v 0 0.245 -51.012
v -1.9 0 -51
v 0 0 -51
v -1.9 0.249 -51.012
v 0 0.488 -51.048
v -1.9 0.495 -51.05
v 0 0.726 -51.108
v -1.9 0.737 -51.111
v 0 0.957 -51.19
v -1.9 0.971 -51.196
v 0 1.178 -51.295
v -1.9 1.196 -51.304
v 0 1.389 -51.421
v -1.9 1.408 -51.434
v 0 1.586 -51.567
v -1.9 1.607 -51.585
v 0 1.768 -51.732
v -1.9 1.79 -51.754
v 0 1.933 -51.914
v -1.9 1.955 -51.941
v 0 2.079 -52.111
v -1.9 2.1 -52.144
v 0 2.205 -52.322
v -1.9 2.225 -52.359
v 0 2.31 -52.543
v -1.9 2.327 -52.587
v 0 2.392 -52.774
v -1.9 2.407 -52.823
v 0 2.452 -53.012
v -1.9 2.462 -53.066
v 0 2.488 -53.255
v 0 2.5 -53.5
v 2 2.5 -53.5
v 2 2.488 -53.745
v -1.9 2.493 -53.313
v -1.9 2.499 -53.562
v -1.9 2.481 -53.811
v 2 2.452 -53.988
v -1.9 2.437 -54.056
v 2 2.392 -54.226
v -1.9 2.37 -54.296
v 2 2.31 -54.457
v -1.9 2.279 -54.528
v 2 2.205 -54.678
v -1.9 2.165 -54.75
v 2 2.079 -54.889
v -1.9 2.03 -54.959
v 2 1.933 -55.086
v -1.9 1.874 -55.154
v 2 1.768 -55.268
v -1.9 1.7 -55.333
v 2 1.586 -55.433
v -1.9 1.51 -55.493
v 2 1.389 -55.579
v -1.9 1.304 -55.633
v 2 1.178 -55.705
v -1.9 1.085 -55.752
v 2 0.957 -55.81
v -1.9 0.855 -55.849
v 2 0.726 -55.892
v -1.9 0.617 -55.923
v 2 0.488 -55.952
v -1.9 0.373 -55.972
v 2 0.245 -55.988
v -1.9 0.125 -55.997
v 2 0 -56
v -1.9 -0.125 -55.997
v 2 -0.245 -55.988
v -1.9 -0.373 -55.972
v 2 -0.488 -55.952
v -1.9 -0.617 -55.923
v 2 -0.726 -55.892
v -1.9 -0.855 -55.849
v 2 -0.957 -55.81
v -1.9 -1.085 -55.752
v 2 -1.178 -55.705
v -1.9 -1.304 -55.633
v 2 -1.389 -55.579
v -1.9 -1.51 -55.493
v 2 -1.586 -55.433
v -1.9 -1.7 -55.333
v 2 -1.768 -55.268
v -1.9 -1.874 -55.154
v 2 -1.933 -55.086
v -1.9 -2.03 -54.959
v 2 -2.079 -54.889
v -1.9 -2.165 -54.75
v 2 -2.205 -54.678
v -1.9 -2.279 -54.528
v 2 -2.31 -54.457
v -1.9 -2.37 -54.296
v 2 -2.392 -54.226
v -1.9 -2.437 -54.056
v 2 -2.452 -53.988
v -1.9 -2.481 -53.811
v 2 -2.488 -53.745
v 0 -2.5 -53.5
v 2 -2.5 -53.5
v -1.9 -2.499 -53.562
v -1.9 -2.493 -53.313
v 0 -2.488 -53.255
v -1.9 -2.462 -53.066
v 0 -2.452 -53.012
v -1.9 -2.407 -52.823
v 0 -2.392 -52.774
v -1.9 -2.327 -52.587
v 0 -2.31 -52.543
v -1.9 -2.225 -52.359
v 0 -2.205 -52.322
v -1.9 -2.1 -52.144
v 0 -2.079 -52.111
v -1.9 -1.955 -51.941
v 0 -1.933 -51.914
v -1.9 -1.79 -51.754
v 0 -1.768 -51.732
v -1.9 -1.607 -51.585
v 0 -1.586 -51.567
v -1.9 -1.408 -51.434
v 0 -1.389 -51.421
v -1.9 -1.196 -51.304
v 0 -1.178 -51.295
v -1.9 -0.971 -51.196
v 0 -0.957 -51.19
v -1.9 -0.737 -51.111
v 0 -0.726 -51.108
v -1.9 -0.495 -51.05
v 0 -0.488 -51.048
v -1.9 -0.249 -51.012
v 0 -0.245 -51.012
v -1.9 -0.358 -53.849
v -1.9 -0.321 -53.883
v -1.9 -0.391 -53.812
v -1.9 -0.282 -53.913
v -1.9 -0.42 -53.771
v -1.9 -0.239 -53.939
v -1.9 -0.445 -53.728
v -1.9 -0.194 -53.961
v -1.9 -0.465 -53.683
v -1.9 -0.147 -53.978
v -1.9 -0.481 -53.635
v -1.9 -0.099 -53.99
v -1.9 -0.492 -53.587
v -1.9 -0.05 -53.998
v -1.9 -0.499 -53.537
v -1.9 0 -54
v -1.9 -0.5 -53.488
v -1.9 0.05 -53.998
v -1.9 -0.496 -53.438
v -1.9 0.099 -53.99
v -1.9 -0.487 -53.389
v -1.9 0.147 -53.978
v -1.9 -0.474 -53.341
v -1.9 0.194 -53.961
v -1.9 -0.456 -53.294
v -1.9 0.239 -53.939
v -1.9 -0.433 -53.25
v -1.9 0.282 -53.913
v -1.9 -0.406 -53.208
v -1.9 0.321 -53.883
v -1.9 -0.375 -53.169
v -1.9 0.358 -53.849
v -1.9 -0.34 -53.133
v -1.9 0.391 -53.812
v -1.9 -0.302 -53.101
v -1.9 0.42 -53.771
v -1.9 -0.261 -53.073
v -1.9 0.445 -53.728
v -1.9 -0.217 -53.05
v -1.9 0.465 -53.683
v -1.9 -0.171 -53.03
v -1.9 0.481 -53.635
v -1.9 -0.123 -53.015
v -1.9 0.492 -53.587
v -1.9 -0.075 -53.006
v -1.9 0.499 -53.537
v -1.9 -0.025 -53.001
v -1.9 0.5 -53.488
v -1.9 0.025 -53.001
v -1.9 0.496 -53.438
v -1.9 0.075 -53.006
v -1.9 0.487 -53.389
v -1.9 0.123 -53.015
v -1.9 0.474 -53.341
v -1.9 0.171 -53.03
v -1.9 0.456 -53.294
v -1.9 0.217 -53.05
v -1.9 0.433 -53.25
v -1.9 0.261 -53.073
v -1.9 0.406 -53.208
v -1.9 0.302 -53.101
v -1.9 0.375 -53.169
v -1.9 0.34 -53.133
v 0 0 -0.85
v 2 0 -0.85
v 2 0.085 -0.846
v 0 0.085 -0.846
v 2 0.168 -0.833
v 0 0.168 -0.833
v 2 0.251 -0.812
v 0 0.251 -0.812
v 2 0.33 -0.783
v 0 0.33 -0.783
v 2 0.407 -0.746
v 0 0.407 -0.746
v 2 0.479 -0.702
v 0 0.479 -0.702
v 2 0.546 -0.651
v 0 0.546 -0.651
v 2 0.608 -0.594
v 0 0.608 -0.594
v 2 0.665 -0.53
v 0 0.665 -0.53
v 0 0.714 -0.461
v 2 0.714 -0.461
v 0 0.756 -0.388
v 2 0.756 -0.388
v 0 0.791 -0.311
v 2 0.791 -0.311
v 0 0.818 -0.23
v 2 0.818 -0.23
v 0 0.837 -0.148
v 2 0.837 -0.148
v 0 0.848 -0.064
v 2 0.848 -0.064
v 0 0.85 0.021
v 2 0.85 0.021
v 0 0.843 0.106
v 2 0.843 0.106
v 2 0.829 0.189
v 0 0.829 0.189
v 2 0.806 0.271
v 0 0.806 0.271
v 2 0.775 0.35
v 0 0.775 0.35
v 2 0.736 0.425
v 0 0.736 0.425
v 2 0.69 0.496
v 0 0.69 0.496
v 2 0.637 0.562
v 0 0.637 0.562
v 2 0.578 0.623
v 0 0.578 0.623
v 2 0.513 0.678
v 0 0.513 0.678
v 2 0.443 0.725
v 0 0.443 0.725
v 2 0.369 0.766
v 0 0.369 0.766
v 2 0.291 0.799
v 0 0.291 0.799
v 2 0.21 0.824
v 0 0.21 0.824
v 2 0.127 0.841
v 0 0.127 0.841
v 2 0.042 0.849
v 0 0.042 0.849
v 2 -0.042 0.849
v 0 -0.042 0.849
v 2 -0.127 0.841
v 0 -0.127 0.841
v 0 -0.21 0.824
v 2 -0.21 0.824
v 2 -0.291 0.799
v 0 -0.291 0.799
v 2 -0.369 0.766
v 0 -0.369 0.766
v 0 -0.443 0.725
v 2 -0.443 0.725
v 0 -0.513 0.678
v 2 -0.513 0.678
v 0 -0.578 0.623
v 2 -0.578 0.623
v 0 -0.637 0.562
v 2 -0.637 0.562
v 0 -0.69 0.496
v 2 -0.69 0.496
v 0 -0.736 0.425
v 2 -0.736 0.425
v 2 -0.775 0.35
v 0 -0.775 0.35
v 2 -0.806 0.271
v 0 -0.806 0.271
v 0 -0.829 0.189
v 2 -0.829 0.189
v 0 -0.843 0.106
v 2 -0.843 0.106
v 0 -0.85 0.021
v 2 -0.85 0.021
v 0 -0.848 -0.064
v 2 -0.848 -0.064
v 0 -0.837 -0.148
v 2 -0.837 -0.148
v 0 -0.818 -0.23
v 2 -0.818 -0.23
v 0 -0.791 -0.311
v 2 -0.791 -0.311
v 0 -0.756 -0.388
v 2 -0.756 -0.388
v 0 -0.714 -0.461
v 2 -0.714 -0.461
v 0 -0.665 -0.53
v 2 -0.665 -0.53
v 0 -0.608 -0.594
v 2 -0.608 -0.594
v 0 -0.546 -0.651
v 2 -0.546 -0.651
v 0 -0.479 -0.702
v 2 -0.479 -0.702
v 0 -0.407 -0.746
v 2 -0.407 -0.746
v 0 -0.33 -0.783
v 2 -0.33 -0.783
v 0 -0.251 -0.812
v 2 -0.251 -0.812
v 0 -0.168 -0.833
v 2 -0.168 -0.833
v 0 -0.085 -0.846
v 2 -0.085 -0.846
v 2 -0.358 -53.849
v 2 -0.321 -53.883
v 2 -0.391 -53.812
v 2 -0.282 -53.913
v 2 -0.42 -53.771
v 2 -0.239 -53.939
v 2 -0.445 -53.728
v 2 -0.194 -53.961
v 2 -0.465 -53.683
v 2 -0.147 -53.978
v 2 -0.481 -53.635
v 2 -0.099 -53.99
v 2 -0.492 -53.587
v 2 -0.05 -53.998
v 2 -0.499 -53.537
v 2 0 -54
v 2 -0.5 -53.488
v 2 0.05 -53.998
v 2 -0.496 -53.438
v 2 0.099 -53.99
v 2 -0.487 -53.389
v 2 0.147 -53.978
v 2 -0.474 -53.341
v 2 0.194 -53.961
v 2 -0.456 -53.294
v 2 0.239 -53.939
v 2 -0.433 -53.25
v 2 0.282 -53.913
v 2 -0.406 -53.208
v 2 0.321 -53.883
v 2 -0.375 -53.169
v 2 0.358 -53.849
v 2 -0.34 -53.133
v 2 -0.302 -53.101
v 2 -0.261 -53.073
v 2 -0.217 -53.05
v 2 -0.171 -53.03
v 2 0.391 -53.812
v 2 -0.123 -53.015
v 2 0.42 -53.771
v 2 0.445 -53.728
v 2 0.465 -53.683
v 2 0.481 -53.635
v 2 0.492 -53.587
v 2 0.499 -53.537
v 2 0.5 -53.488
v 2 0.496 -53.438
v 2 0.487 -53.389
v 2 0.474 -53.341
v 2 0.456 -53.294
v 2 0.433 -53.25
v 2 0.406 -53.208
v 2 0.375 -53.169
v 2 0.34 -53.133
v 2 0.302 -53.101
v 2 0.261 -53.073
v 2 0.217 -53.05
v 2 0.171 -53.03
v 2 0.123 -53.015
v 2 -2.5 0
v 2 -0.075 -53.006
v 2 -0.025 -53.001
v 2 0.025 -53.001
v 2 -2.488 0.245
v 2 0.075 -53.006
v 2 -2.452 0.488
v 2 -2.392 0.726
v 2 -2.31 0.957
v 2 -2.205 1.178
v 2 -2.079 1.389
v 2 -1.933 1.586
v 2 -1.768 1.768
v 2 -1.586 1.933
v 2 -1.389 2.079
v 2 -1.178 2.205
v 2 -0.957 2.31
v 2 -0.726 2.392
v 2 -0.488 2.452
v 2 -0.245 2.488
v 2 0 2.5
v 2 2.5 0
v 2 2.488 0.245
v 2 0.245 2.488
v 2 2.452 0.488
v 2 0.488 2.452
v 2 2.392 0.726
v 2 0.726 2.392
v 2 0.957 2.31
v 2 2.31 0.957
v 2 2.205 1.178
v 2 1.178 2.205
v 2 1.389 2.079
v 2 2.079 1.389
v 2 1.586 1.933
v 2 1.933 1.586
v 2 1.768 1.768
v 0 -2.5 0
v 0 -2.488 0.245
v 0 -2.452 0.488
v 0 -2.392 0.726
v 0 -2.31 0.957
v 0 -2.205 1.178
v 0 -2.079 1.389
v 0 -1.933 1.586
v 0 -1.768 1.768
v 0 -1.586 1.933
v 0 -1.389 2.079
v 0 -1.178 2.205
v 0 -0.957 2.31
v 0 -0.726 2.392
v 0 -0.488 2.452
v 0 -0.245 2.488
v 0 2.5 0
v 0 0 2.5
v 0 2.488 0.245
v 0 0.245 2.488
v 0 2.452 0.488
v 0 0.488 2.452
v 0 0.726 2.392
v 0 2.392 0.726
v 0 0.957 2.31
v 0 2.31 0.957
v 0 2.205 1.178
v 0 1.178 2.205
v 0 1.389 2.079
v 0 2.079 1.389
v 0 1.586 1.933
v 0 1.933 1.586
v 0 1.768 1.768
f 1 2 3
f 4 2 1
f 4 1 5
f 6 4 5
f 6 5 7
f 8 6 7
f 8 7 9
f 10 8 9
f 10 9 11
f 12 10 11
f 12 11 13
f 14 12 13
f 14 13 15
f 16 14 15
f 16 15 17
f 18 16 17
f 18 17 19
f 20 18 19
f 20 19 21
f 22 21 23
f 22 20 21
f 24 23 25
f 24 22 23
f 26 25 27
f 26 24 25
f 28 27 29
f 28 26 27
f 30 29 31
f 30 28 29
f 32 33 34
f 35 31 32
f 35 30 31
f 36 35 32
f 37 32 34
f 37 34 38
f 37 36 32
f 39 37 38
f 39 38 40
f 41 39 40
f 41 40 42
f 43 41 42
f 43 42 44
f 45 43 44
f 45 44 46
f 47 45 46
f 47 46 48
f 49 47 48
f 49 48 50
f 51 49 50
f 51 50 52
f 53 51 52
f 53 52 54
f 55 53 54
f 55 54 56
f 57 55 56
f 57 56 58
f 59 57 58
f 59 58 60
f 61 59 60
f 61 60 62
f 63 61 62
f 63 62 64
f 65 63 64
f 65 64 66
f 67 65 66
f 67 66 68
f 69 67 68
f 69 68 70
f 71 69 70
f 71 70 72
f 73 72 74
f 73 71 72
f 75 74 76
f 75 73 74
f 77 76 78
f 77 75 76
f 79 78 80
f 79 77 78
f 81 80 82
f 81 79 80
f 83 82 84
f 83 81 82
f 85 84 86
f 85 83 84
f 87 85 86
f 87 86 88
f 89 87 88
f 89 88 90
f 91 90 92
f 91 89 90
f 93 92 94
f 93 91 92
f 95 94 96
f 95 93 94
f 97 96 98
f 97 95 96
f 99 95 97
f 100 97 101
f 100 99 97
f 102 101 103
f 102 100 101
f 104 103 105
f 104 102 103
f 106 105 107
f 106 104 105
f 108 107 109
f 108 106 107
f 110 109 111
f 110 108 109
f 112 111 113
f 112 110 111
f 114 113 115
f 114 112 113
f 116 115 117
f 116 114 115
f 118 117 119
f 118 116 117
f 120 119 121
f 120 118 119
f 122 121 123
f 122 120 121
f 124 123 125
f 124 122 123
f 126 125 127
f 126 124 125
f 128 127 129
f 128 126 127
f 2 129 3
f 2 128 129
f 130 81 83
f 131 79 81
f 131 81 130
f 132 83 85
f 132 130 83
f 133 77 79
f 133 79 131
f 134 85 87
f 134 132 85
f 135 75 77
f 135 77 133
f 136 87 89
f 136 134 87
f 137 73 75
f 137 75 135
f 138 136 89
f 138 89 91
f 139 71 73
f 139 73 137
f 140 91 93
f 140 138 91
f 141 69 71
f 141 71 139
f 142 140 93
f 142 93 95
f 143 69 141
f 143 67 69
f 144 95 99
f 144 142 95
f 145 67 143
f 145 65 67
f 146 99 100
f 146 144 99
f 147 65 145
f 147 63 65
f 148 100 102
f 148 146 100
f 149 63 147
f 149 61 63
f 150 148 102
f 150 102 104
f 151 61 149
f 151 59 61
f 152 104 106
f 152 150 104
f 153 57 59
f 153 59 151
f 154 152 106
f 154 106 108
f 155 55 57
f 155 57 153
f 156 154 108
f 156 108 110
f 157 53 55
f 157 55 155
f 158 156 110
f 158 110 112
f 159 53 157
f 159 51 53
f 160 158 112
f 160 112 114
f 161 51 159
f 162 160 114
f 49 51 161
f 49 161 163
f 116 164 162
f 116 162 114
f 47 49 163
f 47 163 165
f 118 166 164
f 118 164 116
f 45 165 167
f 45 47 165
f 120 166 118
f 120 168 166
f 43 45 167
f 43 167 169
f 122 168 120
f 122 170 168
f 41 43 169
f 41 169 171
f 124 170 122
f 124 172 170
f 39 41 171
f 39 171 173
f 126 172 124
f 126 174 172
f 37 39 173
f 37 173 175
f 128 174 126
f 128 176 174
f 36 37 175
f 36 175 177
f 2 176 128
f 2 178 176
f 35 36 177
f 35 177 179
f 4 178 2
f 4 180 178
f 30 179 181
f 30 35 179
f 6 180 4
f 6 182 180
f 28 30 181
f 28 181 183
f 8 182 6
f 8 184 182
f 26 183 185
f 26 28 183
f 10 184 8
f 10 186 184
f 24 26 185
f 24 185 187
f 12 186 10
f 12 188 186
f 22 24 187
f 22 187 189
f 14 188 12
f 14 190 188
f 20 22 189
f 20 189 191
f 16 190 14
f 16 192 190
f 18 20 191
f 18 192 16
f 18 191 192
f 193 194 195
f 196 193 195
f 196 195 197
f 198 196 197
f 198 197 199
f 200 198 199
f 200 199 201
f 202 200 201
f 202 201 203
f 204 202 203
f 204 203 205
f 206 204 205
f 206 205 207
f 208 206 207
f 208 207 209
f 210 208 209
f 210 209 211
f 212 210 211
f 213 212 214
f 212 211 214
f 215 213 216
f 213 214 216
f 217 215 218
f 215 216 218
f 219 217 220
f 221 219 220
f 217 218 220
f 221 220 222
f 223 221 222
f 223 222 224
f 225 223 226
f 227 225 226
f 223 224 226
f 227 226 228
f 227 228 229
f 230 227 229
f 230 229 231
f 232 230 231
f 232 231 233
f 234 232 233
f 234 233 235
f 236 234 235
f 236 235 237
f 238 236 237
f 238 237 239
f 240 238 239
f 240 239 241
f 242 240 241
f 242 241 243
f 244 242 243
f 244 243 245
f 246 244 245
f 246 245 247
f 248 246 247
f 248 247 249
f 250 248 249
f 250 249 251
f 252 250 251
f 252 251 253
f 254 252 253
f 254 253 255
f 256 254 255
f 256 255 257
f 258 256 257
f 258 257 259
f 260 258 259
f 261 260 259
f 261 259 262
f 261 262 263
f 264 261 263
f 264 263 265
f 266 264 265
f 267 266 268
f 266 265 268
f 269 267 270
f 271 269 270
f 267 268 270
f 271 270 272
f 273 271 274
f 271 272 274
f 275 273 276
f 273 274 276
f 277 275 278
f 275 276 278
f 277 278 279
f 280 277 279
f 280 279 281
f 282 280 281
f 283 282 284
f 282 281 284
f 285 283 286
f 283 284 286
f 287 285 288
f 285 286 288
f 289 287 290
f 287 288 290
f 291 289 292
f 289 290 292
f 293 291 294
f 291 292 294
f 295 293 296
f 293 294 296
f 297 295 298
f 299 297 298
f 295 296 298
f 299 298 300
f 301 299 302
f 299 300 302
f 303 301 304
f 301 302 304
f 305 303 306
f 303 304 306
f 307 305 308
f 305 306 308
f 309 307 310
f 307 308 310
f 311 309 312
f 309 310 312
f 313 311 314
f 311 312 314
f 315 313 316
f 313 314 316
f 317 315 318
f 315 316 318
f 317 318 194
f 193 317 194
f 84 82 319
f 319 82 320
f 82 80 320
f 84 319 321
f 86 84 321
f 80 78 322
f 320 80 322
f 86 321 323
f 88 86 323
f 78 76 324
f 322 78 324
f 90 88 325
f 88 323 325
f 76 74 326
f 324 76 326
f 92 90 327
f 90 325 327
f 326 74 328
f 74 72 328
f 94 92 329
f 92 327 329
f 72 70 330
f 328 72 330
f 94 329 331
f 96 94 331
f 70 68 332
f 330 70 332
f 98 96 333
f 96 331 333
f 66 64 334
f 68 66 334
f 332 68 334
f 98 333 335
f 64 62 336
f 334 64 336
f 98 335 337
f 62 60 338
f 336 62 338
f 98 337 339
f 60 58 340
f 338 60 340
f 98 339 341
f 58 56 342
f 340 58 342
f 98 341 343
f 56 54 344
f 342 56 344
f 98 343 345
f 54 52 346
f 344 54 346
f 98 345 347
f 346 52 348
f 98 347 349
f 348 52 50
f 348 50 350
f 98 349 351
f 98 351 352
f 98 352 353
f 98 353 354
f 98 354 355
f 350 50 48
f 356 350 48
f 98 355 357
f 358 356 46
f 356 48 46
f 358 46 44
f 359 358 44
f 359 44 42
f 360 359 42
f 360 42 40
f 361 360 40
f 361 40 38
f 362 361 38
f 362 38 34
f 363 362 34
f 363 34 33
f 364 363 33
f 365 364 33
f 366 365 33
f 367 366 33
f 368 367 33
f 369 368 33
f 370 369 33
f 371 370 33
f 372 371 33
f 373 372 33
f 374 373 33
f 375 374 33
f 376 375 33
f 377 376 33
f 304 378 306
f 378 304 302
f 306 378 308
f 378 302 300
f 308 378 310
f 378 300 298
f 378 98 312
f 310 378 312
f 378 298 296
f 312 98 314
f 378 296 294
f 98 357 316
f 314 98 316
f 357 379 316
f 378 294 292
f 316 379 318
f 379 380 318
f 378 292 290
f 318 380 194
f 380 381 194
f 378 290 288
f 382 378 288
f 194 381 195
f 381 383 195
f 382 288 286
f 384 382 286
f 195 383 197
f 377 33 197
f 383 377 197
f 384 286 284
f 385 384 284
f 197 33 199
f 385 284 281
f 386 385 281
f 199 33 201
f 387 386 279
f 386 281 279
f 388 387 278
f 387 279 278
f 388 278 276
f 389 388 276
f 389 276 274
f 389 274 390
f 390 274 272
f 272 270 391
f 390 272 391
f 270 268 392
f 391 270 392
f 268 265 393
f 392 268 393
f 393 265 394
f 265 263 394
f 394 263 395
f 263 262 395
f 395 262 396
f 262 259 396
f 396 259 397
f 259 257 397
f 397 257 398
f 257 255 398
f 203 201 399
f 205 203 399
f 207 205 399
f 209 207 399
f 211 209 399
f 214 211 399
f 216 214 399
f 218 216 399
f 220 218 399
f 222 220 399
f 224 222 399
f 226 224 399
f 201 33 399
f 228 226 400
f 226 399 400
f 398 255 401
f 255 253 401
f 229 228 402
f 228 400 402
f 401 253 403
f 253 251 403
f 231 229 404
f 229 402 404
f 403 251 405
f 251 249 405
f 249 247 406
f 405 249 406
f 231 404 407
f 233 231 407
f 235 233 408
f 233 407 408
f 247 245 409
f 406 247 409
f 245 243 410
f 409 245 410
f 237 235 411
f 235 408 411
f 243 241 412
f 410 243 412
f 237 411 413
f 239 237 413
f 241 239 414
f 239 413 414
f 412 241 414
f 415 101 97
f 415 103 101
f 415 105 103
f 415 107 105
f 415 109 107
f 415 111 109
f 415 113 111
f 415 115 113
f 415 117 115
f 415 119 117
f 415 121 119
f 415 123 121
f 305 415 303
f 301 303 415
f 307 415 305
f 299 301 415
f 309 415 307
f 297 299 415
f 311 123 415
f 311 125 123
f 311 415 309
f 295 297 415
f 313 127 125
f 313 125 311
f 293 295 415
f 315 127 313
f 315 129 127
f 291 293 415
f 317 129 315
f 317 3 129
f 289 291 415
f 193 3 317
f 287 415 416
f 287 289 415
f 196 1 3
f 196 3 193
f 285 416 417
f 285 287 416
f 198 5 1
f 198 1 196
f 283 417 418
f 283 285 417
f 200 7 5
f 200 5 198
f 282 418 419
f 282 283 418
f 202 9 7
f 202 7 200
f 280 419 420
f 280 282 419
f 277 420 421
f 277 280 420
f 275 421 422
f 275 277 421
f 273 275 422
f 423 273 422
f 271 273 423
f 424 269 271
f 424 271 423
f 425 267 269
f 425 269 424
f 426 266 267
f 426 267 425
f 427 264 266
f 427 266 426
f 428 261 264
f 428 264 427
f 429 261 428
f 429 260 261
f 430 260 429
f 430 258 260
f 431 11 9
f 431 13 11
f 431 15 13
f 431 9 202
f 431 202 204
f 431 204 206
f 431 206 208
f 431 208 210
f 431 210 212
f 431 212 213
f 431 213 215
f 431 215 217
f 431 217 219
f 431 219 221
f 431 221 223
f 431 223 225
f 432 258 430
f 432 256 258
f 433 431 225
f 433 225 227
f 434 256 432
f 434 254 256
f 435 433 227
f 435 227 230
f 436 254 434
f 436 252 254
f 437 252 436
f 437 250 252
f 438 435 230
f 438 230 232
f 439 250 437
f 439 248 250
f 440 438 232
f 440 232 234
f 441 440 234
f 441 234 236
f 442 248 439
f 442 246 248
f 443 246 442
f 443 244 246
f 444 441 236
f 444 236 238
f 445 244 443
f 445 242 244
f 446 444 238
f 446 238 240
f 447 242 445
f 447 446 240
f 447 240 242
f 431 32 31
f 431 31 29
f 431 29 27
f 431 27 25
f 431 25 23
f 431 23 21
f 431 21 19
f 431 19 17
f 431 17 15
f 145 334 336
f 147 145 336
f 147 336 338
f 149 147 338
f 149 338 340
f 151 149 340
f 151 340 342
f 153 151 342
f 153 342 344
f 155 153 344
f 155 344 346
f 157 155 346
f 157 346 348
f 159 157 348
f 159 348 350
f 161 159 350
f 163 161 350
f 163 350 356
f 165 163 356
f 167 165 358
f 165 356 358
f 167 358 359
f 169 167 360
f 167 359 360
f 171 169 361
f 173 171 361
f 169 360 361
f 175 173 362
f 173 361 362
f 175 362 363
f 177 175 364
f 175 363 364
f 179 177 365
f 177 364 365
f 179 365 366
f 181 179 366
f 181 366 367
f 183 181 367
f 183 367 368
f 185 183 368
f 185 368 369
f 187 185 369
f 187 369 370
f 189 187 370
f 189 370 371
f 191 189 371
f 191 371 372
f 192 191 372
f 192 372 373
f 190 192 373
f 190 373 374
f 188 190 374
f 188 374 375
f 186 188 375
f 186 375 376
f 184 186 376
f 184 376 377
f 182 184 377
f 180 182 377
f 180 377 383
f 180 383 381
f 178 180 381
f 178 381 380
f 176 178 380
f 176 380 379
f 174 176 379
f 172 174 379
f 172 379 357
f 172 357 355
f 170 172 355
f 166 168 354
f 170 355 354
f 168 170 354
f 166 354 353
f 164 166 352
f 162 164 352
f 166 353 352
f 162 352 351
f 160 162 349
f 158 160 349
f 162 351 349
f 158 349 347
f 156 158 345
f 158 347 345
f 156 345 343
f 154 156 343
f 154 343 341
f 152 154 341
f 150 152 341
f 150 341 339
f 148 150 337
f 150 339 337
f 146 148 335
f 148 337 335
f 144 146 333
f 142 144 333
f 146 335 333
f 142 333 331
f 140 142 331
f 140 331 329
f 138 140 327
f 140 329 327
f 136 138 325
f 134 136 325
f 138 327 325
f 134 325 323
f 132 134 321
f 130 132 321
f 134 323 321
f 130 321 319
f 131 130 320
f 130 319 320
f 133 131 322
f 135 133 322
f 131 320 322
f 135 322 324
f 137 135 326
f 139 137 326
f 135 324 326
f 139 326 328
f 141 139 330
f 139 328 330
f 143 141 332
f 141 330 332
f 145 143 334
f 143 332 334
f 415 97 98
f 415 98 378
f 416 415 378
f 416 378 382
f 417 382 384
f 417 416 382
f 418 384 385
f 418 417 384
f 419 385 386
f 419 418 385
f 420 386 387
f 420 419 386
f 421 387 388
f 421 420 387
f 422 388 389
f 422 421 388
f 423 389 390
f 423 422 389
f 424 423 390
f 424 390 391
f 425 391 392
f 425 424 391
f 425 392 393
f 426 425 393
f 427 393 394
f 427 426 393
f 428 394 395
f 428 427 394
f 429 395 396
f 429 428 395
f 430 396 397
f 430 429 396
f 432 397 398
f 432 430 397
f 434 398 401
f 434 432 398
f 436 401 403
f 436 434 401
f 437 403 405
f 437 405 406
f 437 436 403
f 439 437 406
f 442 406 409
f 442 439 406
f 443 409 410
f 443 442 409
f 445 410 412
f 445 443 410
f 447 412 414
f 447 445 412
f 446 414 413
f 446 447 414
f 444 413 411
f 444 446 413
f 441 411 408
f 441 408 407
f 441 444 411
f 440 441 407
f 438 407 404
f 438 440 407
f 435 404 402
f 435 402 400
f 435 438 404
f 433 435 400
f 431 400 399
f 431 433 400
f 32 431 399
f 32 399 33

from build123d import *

# Parameters (mm, degrees)
RESSALTO_EXTRUS_O1_DEPTH = 2
CORTE_EXTRUS_O1_REACH    = 58.091
ESBO_O2_R                = 0.85
RESSALTO_EXTRUS_O2_START = 1.9
ESBO_O4_R                = 2.5
RESSALTO_EXTRUS_O2_DEPTH = 1.9
CORTE_EXTRUS_O2_REACH    = 58.191
ESBO_O3_R                = 0.5


with BuildPart() as part:
    # Esboço1 → Ressalto-extrusão1 (new body)
    with BuildSketch(Plane(origin=(0, 0, 0), x_dir=(0, 0, -1), z_dir=(1, 0, 0))):
        with BuildLine():
            Line((0, 2.5), (53.5, 2.5))
            ThreePointArc((53.5, 2.5), (56, 0), (53.5, -2.5))
            Line((53.5, -2.5), (0, -2.5))
            ThreePointArc((0, -2.5), (-2.5, 0), (0, 2.5))
        make_face()
    extrude(amount=RESSALTO_EXTRUS_O1_DEPTH)

    # Esboço2 → Corte-extrusão1 (cut, up to next)
    with BuildSketch(Plane(origin=(2, 0, 0), x_dir=(0, 0, -1), z_dir=(1, 0, 0)), mode=Mode.PRIVATE) as corte_extrus_o1_sk1:
        Circle(ESBO_O2_R)
    corte_extrus_o1_tool1 = extrude(corte_extrus_o1_sk1.sketch, amount=-CORTE_EXTRUS_O1_REACH, mode=Mode.PRIVATE) & part.part
    add(corte_extrus_o1_tool1.solids().sort_by_distance((2, 0, 0))[0], mode=Mode.SUBTRACT)

    # Esboço4 → Ressalto-extrusão2 (add)
    with BuildSketch(Plane.ZY.offset(RESSALTO_EXTRUS_O2_START)):
        with Locations((-53.5, 0)):
            Circle(ESBO_O4_R)
    extrude(amount=-RESSALTO_EXTRUS_O2_DEPTH)

    # Esboço3 → Corte-extrusão2 (cut, up to next)
    with BuildSketch(Plane(origin=(2, 0, 0), x_dir=(0, 0, -1), z_dir=(1, 0, 0)), mode=Mode.PRIVATE) as corte_extrus_o2_sk1:
        with Locations((53.5, 0)):
            Circle(ESBO_O3_R)
    corte_extrus_o2_tool1 = extrude(corte_extrus_o2_sk1.sketch, amount=-CORTE_EXTRUS_O2_REACH, mode=Mode.PRIVATE) & part.part
    add(corte_extrus_o2_tool1.solids().sort_by_distance((2, 0, -53.5))[0], mode=Mode.SUBTRACT)


solid = part.part
